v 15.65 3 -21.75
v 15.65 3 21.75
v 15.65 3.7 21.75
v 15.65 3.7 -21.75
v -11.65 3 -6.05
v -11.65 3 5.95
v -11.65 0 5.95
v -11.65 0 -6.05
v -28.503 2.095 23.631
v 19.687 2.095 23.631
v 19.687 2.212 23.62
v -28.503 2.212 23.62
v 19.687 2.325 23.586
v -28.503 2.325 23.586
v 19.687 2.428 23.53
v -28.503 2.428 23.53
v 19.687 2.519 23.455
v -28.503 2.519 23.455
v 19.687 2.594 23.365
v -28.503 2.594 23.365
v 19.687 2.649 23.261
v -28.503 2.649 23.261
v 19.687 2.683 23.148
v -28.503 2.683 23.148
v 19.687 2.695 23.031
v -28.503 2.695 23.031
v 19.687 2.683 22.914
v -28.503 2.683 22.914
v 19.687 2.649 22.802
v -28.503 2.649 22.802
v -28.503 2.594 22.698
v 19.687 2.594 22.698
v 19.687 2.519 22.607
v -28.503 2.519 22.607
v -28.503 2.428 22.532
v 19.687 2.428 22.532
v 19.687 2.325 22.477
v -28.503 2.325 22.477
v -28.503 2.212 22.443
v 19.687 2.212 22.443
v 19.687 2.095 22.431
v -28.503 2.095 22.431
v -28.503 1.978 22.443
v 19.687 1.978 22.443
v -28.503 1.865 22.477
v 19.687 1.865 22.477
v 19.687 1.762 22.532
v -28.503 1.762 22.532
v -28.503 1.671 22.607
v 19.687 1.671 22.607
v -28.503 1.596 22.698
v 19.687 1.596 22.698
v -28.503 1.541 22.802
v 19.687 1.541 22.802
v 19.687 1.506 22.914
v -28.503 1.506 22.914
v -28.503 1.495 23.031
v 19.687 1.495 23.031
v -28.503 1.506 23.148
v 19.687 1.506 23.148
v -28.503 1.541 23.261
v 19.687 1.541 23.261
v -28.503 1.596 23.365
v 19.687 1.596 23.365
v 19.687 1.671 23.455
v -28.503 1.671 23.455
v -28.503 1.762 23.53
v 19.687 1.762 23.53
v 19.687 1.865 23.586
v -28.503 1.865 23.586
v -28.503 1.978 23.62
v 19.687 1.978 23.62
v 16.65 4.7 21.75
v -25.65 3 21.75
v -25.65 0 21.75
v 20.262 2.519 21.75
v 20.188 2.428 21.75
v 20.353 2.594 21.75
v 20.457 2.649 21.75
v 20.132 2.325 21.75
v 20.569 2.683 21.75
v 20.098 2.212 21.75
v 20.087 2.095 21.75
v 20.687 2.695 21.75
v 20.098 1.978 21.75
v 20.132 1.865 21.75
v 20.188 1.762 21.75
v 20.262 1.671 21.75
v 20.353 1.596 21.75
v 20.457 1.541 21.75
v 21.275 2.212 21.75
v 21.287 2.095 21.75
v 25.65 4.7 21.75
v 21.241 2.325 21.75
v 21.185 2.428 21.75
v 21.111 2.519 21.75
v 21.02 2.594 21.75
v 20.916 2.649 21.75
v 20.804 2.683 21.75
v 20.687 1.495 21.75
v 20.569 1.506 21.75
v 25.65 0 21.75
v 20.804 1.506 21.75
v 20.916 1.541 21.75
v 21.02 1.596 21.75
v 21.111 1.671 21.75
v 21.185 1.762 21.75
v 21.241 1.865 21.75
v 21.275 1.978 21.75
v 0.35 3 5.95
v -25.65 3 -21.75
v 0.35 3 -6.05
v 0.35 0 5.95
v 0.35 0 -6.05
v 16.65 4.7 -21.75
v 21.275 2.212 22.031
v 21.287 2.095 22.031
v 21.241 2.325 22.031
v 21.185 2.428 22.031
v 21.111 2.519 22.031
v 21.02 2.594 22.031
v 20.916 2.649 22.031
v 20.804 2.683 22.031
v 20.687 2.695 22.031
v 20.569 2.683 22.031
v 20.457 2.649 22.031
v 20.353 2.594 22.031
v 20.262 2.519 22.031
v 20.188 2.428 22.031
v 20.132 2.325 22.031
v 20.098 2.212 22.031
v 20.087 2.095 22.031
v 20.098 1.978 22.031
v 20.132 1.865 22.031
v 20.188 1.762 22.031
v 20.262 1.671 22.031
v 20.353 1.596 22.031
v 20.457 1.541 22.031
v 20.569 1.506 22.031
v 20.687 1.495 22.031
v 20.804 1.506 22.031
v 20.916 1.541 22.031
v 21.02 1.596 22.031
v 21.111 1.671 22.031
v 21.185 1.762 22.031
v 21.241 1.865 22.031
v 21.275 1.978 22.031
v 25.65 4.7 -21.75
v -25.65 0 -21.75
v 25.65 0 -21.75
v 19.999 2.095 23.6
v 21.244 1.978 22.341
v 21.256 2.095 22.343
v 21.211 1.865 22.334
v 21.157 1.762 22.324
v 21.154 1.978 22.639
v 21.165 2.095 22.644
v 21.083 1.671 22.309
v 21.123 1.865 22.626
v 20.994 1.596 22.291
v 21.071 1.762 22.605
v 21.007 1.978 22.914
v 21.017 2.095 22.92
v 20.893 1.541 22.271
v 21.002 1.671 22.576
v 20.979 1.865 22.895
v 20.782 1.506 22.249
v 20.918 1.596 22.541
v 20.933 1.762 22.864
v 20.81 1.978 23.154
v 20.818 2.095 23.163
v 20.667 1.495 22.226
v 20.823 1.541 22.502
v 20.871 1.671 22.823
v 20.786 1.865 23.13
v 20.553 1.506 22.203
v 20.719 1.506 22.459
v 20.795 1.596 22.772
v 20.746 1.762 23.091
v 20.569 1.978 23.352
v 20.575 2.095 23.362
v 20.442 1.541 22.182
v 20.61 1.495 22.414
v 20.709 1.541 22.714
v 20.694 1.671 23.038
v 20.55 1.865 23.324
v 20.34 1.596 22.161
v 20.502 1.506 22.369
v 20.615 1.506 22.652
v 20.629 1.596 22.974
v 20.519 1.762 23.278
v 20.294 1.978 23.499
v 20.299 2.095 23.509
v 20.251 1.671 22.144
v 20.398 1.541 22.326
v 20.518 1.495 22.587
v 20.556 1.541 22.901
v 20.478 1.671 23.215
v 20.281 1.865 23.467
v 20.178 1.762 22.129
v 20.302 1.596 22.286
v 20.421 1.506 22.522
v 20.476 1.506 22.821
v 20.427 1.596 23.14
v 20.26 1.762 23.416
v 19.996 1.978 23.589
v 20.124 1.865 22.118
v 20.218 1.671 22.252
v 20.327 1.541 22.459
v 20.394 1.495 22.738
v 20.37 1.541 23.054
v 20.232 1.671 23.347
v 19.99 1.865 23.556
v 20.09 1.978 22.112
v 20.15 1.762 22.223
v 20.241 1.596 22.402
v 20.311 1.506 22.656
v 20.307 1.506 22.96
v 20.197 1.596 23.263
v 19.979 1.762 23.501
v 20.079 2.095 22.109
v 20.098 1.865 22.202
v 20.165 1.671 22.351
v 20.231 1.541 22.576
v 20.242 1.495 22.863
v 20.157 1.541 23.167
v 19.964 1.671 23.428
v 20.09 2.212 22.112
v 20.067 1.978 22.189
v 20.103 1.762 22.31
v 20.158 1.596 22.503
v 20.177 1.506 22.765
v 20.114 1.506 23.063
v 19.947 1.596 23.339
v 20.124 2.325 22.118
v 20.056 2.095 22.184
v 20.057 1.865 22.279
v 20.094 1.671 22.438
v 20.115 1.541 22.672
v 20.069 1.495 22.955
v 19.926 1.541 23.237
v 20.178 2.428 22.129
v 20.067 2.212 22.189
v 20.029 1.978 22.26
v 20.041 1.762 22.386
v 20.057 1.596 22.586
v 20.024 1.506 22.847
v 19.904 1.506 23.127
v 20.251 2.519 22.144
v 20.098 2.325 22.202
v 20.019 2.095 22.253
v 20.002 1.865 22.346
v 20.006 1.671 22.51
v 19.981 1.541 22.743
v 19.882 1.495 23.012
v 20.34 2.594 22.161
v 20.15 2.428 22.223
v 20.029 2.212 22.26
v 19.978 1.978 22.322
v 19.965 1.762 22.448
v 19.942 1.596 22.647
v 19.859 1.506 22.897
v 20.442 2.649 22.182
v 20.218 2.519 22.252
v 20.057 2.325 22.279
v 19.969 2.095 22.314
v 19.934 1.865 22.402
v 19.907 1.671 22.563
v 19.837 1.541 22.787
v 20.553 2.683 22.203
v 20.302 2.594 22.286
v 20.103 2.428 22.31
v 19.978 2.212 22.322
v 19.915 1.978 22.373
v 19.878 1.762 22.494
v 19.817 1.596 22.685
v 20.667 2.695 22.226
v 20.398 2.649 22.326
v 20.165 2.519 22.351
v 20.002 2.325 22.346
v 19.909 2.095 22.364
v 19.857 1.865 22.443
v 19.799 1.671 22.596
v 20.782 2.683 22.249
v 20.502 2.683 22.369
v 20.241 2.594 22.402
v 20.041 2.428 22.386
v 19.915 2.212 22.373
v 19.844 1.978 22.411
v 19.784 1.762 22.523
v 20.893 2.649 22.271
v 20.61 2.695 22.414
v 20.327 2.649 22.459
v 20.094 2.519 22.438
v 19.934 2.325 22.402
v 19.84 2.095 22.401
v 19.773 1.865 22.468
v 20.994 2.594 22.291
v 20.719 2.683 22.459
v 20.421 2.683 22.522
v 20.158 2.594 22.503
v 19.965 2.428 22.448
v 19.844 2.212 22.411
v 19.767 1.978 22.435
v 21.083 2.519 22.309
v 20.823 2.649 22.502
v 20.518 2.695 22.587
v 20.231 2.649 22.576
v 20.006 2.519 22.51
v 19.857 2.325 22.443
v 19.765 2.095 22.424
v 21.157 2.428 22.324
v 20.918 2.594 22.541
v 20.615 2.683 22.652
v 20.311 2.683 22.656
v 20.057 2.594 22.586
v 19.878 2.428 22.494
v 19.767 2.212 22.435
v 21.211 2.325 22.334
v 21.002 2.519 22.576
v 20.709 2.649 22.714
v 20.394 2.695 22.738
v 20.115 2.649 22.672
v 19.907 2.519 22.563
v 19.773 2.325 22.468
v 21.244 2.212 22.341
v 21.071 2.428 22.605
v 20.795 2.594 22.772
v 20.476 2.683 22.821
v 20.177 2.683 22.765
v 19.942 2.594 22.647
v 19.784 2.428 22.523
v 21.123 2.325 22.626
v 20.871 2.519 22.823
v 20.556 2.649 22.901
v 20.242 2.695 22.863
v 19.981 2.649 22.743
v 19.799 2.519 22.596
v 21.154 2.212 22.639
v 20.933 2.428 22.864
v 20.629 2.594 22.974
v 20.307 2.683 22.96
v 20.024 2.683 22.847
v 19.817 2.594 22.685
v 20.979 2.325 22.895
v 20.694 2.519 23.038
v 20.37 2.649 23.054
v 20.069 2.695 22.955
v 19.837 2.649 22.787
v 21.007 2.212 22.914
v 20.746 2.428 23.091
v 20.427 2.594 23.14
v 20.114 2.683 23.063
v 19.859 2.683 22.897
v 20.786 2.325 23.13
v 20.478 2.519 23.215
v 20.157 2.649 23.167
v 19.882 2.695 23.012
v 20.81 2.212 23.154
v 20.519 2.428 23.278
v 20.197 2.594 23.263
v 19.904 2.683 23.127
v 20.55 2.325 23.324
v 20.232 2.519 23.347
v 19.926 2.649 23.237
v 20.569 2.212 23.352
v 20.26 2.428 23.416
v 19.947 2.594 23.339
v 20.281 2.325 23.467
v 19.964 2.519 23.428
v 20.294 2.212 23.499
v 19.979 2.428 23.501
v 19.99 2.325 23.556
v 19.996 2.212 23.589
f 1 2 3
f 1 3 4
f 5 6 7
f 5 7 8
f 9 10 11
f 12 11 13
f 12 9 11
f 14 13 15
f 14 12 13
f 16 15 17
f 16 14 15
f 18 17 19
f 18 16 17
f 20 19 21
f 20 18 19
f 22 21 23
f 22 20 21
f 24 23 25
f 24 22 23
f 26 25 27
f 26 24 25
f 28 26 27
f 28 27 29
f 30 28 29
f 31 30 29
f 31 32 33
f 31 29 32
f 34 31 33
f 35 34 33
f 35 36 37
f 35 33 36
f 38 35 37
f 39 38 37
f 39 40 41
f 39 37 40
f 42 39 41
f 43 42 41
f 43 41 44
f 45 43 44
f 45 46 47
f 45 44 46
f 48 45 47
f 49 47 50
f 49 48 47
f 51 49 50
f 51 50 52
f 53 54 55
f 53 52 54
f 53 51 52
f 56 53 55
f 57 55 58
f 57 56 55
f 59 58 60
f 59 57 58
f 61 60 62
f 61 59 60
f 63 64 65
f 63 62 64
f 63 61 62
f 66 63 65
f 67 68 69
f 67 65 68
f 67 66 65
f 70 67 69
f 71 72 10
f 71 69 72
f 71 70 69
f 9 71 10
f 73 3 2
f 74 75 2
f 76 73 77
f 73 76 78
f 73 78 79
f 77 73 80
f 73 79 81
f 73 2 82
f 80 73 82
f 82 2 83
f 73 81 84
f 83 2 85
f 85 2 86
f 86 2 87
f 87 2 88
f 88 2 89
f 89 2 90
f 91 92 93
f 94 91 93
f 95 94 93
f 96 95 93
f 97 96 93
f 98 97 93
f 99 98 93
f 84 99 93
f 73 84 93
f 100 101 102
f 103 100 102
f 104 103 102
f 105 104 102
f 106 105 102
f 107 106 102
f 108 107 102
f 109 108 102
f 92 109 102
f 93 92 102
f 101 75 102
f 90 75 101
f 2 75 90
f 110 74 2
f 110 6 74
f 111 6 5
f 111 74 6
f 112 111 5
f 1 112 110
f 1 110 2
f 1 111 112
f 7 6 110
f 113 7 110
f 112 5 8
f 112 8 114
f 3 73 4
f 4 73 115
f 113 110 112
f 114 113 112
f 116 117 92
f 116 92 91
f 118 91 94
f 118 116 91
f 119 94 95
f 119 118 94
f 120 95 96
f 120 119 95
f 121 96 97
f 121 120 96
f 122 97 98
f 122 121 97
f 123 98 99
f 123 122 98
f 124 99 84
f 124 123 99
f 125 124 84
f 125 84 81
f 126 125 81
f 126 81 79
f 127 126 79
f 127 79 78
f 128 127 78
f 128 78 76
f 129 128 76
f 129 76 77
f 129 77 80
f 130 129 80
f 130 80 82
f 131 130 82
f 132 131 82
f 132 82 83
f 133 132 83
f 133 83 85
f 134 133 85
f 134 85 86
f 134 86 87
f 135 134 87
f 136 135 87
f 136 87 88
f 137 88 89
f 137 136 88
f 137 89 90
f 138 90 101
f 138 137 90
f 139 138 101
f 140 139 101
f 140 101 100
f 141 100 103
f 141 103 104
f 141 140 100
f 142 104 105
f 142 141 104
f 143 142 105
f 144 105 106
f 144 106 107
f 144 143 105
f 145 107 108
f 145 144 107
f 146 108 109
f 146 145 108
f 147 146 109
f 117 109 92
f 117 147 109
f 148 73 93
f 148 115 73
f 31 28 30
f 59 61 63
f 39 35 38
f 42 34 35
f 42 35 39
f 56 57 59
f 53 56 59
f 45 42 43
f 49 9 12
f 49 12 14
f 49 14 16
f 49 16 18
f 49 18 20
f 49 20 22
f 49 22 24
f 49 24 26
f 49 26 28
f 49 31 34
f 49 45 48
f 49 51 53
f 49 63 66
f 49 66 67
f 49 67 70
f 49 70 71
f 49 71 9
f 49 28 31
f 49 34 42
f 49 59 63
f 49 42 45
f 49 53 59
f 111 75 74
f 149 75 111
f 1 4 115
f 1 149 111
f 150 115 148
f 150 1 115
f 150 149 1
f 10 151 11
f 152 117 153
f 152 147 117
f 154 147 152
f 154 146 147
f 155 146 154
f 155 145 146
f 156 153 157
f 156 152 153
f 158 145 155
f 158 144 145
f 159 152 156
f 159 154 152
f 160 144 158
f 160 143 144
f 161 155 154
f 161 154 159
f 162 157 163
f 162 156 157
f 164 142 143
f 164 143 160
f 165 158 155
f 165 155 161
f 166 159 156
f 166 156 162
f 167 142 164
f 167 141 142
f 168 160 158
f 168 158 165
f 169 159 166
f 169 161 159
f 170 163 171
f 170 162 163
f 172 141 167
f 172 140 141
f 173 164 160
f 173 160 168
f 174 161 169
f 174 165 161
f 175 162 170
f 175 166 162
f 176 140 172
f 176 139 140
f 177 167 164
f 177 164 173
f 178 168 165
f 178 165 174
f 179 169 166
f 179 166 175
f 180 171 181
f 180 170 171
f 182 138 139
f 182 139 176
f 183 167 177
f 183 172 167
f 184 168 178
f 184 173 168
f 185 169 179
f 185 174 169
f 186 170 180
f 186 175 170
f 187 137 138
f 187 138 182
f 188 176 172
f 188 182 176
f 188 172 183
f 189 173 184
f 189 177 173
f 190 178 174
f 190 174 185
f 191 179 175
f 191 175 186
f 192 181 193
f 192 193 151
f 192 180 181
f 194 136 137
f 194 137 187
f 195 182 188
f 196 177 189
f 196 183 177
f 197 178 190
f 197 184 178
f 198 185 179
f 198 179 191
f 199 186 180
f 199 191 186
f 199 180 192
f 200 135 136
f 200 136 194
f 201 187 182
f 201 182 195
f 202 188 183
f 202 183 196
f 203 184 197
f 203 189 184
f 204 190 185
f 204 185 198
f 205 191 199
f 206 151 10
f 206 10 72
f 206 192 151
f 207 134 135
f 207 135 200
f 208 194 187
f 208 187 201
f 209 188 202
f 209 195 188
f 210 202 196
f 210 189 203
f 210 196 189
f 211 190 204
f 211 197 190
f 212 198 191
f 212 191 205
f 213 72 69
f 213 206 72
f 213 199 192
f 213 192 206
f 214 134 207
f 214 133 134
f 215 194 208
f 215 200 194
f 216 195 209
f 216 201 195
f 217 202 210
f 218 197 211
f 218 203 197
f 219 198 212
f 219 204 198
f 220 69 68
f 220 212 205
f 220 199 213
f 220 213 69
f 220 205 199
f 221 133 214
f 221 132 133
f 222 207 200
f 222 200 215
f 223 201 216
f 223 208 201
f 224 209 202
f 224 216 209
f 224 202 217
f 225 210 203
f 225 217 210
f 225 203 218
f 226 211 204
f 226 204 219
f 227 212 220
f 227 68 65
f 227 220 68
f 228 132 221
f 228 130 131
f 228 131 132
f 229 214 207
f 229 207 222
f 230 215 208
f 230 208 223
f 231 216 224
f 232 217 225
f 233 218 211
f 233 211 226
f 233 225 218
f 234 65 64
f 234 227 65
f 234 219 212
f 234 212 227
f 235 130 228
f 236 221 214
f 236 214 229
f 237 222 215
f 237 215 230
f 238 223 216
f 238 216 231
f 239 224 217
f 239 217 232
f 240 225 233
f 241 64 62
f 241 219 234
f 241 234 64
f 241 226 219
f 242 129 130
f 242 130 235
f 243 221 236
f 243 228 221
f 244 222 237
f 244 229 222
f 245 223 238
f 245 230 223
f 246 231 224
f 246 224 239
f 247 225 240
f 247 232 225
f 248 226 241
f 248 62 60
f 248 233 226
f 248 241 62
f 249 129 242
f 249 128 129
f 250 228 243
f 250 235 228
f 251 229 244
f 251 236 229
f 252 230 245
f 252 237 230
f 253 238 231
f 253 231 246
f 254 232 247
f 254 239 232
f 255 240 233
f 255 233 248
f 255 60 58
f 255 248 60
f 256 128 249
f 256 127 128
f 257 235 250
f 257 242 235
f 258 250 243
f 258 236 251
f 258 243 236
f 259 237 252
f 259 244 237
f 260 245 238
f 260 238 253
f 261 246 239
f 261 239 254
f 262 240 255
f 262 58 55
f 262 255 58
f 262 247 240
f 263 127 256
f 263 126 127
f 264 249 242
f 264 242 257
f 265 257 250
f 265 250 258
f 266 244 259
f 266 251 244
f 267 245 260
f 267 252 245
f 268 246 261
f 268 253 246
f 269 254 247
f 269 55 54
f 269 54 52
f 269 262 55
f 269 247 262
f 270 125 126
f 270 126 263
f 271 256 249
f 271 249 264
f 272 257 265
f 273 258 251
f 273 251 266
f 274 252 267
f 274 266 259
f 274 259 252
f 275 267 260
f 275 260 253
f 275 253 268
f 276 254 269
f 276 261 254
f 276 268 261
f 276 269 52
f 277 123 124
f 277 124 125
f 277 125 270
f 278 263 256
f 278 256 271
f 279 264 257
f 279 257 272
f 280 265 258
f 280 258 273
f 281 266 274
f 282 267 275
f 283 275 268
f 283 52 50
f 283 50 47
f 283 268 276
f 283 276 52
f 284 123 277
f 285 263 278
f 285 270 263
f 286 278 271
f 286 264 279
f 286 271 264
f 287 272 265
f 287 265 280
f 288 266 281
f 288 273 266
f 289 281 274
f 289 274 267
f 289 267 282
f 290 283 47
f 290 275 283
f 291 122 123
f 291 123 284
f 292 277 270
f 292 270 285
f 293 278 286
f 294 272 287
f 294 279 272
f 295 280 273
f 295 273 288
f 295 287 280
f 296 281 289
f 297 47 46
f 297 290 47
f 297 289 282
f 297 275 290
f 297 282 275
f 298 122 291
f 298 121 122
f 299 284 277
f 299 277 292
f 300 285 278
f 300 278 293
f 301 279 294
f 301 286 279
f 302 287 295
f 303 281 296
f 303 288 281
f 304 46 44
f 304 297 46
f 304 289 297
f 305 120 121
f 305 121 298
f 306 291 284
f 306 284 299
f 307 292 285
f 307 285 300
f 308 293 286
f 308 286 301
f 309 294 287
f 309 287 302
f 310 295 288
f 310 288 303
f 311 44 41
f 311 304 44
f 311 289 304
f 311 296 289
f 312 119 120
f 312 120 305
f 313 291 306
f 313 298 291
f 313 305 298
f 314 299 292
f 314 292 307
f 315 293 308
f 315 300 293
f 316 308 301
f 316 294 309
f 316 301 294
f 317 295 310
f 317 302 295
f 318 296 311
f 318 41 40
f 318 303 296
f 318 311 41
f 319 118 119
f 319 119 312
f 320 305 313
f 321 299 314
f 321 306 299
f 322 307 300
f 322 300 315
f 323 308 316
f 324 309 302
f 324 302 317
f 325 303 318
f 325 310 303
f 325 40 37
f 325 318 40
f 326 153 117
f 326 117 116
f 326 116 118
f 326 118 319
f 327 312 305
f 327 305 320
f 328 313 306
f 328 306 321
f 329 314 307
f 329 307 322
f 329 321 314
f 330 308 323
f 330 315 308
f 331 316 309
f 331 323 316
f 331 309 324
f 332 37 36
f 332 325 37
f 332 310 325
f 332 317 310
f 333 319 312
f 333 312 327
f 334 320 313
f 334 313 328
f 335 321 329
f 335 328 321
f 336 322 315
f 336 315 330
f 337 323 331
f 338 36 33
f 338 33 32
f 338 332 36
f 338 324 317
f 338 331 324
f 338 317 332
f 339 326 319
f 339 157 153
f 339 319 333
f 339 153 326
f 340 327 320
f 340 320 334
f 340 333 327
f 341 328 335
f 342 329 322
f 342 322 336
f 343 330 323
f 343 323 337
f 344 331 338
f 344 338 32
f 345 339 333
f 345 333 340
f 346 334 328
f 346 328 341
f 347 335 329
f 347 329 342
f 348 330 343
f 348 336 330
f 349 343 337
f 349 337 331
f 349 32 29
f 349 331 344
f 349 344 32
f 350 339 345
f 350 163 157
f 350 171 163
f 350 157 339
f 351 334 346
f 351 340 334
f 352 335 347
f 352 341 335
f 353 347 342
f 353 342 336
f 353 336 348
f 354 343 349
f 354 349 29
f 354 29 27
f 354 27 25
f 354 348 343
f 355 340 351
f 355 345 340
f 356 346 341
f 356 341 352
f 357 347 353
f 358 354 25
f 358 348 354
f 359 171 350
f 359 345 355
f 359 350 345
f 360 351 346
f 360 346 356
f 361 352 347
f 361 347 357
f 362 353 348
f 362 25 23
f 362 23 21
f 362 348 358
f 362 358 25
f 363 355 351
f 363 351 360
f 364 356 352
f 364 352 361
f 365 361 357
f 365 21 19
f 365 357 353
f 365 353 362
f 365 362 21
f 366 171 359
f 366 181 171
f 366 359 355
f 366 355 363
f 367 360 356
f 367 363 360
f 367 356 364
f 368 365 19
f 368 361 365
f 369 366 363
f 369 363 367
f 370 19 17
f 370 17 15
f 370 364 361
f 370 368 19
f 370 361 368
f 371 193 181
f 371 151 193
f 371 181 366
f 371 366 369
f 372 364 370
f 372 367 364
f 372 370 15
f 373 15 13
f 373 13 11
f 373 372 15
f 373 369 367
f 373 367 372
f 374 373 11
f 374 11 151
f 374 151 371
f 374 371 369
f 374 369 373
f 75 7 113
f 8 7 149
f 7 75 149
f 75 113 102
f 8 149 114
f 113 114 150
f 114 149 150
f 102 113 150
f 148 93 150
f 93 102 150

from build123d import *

# Parameters (mm, degrees)
SKETCH1_W           = 51.3
SKETCH1_H           = 43.5
BOSS_EXTRUDE1_DEPTH = 3
SKETCH2_W           = 12
SKETCH2_H           = 12
CUT_EXTRUDE1_DEPTH  = 3
SKETCH3_W           = 10
SKETCH3_H           = 43.5
BOSS_EXTRUDE2_DEPTH = 1.7
CHAMFER1_SIZE       = 1
SKETCH4_R           = 0.6


with BuildPart() as part:
    # Sketch1 → Boss-Extrude1 (new body)
    with BuildSketch(Plane(origin=(0, 0, 0), x_dir=(1, 0, 0), z_dir=(0, 1, 0))):
        Rectangle(SKETCH1_W, SKETCH1_H)
    extrude(amount=BOSS_EXTRUDE1_DEPTH)

    # Sketch2 → Cut-Extrude1 (cut)
    with BuildSketch(Plane(origin=(0, 3, 0), x_dir=(1, 0, 0), z_dir=(0, 1, 0))):
        with Locations((-5.65, 0.05)):
            Rectangle(SKETCH2_W, SKETCH2_H)
    extrude(amount=-CUT_EXTRUDE1_DEPTH, mode=Mode.SUBTRACT)

    # Sketch3 → Boss-Extrude2 (add)
    with BuildSketch(Plane(origin=(0, 3, 0), x_dir=(1, 0, 0), z_dir=(0, 1, 0))):
        with Locations((20.65, 0)):
            Rectangle(SKETCH3_W, SKETCH3_H)
    extrude(amount=BOSS_EXTRUDE2_DEPTH)

    # Chamfer1
    chamfer1_edges = [part.edges().sort_by_distance(p)[0] for p in [
        (15.65, 4.7, 0),
    ]]
    chamfer(chamfer1_edges, length=CHAMFER1_SIZE)

    # handle: sweep along a path in Sketch5
    with BuildLine(Plane(origin=(0, 3, 0), x_dir=(1, 0, 0), z_dir=(0, 1, 0))) as handle_path:
        Line((20.68654036, -21.75), (20.68654036, -22.031235757))
        ThreePointArc((20.68654036, -22.031235757), (20.393647141, -22.738342538), (19.68654036, -23.031235757))
        Line((19.68654036, -23.031235757), (-28.502744804, -23.031235757))
    # Sketch4 → handle (sweep)
    with BuildSketch(Plane.XY.offset(21.75)):
        with Locations((20.68654036, 2.094896924)):
            Circle(SKETCH4_R)
    sweep(path=handle_path.line)


solid = part.part
